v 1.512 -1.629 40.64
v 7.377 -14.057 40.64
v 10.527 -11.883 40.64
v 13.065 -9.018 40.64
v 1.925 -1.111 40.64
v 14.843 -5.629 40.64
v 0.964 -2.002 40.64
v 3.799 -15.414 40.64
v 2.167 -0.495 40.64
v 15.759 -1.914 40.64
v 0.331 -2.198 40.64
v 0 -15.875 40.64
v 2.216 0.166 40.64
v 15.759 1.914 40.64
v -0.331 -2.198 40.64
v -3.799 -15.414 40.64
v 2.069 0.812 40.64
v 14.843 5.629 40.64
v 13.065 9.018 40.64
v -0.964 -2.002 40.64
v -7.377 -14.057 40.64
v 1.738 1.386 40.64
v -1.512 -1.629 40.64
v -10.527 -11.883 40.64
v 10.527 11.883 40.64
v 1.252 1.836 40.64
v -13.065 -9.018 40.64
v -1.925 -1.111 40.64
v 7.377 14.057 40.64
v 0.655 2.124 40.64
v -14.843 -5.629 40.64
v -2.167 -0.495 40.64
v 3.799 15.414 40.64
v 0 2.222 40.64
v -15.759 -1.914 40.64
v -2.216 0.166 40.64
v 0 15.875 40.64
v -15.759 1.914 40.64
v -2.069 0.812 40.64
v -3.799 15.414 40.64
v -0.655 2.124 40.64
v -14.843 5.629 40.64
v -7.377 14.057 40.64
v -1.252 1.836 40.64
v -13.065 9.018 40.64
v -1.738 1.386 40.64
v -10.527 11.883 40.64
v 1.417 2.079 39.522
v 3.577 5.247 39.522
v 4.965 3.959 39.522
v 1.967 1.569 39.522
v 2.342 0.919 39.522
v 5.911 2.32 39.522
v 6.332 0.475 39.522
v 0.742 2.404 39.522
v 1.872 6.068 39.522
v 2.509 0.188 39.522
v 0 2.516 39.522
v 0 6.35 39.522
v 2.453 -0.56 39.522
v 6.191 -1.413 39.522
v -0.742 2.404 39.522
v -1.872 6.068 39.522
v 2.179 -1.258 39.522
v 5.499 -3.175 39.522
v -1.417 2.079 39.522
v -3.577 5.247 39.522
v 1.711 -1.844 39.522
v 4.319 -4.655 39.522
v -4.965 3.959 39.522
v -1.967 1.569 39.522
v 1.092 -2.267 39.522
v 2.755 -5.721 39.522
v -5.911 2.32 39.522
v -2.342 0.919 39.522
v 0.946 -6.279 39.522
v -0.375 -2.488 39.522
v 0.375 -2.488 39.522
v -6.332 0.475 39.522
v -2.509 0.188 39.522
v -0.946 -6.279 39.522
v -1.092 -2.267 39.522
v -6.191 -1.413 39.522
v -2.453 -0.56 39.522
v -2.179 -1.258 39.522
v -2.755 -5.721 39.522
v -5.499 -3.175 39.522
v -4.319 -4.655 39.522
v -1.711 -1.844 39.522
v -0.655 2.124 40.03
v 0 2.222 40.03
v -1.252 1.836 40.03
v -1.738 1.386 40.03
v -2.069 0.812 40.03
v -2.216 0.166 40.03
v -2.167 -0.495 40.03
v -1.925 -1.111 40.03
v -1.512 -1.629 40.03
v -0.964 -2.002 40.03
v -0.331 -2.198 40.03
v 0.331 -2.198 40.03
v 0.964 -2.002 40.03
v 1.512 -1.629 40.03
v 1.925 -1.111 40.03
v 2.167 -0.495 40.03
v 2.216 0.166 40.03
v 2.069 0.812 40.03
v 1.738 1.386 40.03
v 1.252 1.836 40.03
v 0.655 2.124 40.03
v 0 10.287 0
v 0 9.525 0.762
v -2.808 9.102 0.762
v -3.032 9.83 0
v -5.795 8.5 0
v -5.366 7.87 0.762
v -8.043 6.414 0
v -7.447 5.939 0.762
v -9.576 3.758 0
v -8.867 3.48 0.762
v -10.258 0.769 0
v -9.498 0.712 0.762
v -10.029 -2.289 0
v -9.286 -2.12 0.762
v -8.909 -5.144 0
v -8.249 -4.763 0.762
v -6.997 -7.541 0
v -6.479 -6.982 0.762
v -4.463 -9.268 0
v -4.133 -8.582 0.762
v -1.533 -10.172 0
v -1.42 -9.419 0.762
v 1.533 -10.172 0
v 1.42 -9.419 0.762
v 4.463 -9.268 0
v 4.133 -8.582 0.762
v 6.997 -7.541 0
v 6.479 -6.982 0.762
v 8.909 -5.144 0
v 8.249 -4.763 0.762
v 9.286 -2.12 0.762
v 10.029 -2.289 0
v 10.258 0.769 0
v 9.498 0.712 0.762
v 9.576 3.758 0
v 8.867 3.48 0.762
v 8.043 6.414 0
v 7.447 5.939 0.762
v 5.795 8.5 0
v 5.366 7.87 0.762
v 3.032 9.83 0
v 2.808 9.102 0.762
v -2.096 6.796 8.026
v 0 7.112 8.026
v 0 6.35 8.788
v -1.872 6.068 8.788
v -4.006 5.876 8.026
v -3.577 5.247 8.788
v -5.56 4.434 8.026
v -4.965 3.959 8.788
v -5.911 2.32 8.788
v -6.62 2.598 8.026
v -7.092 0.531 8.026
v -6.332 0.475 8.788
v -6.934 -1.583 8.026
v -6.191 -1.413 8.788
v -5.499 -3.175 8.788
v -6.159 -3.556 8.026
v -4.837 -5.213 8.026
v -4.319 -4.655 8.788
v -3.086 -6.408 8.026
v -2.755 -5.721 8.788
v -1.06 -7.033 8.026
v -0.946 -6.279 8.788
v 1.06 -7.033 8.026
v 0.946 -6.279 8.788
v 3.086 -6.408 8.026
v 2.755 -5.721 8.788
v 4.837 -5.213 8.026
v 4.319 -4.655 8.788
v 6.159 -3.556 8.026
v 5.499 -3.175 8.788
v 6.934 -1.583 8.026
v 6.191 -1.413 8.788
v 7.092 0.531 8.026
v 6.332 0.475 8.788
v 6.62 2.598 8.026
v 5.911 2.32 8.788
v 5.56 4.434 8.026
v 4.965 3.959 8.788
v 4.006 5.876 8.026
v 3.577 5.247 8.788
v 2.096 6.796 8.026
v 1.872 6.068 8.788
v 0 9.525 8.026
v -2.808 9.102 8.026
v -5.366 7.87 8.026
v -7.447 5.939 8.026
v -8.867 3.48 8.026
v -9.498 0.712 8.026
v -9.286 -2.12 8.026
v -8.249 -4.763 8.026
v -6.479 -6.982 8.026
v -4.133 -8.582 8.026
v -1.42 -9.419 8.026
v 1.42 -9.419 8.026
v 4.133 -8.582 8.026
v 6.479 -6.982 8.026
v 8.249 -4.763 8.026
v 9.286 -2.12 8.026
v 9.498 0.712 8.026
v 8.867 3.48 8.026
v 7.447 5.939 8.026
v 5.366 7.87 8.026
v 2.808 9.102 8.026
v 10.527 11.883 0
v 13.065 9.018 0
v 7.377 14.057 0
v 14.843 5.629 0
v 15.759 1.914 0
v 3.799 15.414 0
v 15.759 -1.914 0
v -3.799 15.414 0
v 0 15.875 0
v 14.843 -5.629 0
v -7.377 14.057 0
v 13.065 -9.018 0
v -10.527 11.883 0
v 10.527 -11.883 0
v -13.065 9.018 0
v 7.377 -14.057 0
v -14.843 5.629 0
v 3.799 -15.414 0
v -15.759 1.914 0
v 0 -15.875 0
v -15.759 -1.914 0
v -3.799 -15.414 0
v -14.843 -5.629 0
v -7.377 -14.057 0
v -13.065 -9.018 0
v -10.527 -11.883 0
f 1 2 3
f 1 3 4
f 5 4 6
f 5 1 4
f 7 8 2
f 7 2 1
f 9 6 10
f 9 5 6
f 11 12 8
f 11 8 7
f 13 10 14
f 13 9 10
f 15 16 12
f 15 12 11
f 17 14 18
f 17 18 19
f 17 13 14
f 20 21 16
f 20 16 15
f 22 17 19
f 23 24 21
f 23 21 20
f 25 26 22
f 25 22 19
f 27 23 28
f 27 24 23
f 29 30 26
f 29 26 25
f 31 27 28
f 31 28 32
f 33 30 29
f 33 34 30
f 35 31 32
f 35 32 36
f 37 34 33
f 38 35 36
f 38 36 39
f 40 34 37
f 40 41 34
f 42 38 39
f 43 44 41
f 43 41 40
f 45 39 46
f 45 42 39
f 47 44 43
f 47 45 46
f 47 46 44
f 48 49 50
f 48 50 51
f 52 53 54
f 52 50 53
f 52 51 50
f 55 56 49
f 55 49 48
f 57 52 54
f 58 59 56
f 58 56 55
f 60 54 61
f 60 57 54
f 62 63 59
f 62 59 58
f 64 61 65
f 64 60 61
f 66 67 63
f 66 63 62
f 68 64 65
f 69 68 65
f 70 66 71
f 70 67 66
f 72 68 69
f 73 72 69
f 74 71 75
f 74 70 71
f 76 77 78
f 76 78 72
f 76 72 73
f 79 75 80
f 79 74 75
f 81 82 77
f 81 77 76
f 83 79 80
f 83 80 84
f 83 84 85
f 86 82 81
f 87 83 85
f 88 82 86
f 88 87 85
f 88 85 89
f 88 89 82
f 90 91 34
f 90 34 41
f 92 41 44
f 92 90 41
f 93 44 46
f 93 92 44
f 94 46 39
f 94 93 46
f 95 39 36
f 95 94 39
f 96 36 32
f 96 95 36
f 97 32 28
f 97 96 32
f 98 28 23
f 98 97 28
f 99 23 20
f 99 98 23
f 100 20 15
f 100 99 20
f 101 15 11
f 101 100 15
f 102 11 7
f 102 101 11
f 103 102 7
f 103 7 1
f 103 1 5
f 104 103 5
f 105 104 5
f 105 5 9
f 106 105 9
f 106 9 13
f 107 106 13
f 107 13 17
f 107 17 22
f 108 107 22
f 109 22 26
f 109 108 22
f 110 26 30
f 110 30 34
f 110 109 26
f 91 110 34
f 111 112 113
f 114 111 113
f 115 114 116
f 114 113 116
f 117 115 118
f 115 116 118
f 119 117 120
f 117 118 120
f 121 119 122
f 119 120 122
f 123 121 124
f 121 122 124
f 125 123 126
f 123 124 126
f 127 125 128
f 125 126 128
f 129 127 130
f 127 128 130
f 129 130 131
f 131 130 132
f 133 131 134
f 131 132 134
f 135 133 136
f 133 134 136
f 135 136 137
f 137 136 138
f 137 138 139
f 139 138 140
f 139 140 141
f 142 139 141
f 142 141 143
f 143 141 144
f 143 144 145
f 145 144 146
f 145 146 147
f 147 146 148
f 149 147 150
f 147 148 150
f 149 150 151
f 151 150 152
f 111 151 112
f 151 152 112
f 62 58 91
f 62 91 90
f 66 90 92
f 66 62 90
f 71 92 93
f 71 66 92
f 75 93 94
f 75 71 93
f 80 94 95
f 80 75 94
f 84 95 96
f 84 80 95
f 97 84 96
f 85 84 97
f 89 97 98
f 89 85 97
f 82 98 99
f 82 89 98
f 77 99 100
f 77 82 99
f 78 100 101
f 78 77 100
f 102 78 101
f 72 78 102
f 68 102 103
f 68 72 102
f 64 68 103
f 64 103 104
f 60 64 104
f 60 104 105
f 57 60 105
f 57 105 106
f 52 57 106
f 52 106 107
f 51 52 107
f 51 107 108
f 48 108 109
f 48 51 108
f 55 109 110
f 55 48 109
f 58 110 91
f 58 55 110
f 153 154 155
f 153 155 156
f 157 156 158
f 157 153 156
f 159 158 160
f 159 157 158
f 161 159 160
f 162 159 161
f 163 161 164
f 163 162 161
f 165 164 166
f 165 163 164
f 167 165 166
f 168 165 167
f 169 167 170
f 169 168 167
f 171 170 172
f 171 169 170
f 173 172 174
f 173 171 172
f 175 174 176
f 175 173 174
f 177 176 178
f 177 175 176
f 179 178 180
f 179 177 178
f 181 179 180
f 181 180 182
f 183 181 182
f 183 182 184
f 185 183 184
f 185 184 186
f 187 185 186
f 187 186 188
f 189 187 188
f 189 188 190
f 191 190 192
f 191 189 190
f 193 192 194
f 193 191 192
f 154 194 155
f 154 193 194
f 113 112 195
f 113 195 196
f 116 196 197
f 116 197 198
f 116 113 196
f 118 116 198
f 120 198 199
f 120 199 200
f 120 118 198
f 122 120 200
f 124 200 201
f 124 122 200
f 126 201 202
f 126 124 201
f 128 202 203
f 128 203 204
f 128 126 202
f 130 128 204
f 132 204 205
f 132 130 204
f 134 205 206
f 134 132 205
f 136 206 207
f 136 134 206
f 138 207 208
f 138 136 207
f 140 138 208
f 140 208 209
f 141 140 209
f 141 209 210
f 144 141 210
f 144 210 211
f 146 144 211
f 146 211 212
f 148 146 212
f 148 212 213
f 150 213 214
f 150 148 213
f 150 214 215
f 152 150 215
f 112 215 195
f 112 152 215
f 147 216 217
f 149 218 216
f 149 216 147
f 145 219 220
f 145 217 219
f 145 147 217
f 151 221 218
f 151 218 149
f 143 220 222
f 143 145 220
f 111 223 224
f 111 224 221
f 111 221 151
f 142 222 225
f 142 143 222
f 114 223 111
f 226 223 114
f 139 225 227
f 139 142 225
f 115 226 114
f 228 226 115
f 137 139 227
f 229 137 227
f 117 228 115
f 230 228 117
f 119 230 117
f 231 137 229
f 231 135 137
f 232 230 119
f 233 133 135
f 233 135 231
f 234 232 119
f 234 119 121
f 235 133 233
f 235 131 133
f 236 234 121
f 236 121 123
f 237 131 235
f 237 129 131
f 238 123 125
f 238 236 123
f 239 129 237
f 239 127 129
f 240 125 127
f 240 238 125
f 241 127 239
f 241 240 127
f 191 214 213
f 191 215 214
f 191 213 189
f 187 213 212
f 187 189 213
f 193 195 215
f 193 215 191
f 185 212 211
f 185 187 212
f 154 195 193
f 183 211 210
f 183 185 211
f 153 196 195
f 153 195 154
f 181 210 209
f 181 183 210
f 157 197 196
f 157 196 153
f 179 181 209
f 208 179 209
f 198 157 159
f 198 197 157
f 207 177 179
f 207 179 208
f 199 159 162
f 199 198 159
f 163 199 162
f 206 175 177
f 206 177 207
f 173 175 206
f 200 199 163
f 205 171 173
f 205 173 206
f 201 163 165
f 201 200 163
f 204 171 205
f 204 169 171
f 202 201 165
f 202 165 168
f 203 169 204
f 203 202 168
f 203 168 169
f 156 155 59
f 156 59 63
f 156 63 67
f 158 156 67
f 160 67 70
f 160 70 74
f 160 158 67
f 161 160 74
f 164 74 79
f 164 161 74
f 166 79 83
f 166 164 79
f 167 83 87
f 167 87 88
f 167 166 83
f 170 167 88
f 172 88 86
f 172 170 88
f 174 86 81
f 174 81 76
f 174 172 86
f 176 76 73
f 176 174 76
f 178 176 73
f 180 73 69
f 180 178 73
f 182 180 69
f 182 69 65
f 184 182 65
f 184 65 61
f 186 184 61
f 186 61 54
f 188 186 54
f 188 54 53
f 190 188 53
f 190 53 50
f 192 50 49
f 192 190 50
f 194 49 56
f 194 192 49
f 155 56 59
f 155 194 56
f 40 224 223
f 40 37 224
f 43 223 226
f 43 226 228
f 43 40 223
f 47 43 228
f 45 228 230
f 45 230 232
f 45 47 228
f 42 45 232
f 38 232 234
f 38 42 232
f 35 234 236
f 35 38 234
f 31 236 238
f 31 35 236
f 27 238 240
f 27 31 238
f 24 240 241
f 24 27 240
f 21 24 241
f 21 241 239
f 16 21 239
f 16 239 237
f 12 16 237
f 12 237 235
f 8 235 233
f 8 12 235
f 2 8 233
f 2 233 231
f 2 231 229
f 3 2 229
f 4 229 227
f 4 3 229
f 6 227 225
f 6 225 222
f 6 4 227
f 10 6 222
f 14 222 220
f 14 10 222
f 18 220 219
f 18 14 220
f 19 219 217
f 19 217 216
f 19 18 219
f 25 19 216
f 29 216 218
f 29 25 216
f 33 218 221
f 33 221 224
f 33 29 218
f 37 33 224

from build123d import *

# Parameters (mm, degrees)
F2_SIZE2 = 0.293294
F2_SIZE  = 0.508
F3_SIZE  = 0.762


with BuildPart() as f1:
    # F0 (on Right) → F1 (revolve)
    with BuildSketch(Plane.YZ):
        Polygon((15.875, 40.64), (2.2225, 40.64), (2.2225, 39.5224), (6.35, 39.5224), (6.35, 8.0264), (9.525, 8.0264), (9.525, 0), (15.875, 0), align=None)
    revolve(axis=Axis((0, 0, 20.32), (0, 0, 1)))

    # F2
    f2_edges = [f1.edges().sort_by_distance(p)[0] for p in [
        (0, -2.2225, 39.5224),
    ]]
    chamfer(f2_edges, length=F2_SIZE, length2=F2_SIZE2)

    # F3
    f3_edges = [f1.edges().sort_by_distance(p)[0] for p in [
        (0, -6.35, 8.0264),
        (0, -9.525, 0),
    ]]
    chamfer(f3_edges, length=F3_SIZE)


solid = f1.part
